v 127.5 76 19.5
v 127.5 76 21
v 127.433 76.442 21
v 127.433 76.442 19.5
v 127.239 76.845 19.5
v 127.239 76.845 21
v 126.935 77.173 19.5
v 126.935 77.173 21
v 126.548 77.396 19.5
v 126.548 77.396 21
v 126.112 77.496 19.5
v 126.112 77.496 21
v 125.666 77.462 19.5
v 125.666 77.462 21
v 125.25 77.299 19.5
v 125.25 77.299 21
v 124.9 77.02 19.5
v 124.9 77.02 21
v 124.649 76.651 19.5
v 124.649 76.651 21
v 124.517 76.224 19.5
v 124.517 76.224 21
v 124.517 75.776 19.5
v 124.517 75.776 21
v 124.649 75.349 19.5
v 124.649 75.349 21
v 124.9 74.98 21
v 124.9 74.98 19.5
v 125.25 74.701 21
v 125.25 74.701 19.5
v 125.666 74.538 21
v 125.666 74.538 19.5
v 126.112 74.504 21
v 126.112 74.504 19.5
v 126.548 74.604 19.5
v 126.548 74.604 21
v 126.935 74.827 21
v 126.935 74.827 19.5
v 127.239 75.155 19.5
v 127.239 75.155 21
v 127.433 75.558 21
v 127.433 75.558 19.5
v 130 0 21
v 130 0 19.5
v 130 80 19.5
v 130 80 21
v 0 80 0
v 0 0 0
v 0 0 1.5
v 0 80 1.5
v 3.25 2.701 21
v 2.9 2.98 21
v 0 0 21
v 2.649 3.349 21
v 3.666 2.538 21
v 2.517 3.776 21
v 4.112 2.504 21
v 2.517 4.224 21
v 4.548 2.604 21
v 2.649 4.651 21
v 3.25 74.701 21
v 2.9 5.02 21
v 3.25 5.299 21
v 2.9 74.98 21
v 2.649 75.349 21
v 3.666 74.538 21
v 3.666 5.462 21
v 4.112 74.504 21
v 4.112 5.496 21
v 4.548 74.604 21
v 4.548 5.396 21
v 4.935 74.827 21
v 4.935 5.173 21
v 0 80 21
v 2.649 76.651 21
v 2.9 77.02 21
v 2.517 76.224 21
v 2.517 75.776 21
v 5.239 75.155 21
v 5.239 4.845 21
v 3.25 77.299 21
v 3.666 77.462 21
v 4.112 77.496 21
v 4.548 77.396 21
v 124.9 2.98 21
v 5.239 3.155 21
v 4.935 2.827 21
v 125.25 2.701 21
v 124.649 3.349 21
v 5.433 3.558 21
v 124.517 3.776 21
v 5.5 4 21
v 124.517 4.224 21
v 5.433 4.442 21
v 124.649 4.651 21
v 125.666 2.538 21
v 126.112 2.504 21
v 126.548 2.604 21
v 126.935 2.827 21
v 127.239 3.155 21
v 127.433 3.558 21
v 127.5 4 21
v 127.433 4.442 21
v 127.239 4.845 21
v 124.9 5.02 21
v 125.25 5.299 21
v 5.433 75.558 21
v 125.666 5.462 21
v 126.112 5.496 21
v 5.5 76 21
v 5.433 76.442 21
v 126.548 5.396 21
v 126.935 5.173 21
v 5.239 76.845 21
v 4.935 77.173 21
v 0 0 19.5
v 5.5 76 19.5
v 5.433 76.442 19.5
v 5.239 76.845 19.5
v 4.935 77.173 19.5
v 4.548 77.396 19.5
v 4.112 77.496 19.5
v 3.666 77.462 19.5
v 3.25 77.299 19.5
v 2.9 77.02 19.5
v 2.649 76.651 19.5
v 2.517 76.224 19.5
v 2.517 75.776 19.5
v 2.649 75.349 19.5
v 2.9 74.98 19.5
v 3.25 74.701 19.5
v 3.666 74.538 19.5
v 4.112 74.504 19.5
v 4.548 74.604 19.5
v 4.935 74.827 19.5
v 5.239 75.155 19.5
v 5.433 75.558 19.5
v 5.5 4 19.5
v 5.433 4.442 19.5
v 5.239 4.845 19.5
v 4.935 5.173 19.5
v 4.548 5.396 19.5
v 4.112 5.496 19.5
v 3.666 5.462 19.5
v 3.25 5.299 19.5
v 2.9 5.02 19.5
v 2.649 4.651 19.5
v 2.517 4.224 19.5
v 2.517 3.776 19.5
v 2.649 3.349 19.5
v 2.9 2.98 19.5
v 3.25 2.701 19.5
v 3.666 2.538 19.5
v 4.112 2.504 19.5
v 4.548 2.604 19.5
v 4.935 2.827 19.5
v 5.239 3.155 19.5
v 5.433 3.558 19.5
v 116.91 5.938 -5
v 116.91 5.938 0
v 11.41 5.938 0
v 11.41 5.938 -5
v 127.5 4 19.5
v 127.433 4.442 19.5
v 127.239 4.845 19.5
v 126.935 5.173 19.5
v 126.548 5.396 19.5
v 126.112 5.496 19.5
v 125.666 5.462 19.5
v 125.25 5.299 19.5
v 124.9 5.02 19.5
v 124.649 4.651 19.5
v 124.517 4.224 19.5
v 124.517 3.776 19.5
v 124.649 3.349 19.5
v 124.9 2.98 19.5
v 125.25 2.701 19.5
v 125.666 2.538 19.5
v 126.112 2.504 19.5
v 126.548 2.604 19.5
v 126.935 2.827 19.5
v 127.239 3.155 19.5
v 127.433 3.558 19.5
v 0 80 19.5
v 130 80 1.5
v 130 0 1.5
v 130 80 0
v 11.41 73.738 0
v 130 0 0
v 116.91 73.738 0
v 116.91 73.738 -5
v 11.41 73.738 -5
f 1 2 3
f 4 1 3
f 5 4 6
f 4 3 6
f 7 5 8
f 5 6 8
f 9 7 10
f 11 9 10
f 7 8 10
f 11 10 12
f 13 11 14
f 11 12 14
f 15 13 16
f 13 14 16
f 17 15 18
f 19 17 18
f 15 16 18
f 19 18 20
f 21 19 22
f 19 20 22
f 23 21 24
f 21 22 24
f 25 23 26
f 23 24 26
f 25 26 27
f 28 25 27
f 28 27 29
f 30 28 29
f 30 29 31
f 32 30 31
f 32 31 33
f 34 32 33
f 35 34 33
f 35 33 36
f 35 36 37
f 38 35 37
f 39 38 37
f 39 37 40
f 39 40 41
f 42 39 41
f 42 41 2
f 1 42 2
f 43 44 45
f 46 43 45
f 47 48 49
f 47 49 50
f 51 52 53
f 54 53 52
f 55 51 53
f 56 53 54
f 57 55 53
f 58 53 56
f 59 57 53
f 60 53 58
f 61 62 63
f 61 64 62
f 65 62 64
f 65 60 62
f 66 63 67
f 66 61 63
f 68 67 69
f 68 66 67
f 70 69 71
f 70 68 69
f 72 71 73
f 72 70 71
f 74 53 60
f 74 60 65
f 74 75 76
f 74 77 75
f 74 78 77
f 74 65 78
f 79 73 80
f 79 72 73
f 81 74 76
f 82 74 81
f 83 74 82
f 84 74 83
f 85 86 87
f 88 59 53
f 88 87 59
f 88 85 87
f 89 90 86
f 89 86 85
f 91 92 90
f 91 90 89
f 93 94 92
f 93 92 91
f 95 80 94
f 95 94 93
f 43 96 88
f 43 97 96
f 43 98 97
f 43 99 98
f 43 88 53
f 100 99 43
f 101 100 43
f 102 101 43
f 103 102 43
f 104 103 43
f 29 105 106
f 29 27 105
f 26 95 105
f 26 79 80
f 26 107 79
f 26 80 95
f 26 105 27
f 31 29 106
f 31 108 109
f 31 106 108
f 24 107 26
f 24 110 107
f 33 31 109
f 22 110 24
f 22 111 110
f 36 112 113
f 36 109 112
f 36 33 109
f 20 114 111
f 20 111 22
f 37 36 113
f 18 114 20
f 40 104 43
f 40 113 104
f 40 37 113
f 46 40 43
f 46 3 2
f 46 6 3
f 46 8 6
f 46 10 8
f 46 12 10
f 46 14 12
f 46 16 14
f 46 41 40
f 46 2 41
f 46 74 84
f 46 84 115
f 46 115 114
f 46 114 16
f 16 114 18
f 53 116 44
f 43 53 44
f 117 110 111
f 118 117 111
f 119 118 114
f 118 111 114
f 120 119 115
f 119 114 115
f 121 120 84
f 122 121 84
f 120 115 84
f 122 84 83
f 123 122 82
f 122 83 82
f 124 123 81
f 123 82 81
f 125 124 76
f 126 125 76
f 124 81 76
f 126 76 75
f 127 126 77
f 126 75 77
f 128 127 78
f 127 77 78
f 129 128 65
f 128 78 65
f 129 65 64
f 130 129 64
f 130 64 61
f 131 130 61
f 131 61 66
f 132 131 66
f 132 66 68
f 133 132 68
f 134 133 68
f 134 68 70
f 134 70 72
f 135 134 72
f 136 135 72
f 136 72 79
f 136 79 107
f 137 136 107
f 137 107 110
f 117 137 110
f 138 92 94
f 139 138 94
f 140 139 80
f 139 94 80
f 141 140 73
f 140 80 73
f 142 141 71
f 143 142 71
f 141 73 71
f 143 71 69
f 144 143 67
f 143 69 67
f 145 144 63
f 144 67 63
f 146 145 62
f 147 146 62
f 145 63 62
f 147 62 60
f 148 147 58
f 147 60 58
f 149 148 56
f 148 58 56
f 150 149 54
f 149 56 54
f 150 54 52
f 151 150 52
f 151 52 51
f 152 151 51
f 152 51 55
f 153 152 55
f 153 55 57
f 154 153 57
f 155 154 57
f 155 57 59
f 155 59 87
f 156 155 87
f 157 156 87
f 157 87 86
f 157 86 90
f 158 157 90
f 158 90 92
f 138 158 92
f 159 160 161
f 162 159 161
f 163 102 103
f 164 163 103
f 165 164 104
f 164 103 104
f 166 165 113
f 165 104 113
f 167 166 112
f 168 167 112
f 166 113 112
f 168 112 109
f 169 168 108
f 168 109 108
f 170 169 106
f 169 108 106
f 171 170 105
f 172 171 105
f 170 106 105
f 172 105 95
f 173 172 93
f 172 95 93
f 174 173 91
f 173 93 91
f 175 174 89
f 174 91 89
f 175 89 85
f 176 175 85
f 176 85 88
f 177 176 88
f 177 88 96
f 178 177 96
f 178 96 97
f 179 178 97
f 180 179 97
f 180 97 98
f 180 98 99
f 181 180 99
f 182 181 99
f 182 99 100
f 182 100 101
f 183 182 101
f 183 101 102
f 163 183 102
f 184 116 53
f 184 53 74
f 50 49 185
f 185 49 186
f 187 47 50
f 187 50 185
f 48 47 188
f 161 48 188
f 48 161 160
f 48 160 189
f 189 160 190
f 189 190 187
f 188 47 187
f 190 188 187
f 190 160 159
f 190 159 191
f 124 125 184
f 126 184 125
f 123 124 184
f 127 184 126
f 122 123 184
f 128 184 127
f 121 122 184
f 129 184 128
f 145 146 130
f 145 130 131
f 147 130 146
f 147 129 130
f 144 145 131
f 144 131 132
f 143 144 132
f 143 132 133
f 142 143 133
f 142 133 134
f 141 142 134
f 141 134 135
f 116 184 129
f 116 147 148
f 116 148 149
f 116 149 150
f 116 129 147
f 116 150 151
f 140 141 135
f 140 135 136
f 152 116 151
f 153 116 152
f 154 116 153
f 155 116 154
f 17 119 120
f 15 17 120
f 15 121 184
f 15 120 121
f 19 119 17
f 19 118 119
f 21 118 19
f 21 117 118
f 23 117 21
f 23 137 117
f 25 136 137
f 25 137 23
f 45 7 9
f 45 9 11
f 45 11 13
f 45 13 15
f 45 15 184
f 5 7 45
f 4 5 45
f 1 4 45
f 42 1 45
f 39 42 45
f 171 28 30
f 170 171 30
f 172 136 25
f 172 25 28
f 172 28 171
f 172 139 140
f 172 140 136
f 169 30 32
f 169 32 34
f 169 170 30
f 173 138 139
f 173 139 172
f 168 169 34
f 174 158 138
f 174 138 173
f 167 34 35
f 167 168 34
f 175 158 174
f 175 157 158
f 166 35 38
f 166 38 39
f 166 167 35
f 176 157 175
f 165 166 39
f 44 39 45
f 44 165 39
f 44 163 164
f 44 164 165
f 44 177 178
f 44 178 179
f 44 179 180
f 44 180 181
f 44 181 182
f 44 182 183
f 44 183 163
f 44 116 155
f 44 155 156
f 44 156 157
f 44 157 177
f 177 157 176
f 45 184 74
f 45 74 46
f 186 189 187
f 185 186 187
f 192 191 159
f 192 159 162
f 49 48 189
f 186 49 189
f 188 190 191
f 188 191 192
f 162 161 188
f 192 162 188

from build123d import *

# Parameters (mm, degrees)
ESQUISSE1_W             = 130
ESQUISSE1_H             = 80
BOSS_EXTRU_1_DEPTH      = 21
COQUE3_T                = -1.5
ESQUISSE2_W             = 105.5
ESQUISSE2_H             = 67.8
BOSS_EXTRU_2_DEPTH      = 5
ESQUISSE3_R             = 1.5
ENL_V_MAT_EXTRU_1_DEPTH = 10
ESQUISSE4_W             = 130
ESQUISSE4_H             = 18
ENL_V_MAT_EXTRU_2_DEPTH = 10


with BuildPart() as part:
    # Esquisse1 → Boss.-Extru.1 (new body)
    with BuildSketch(Plane.XY):
        with Locations((65, 40)):
            Rectangle(ESQUISSE1_W, ESQUISSE1_H)
    extrude(amount=BOSS_EXTRU_1_DEPTH)

    # Coque3
    coque3_openings = [part.faces().sort_by_distance(p)[0] for p in [
        (130, 40, 10.5),
        (65, 0, 10.5),
        (0, 40, 10.5),
    ]]
    offset(amount=COQUE3_T, openings=coque3_openings, kind=Kind.INTERSECTION)

    # Esquisse2 → Boss.-Extru.2 (add)
    with BuildSketch(Plane(origin=(0, 0, 0), x_dir=(-1, 0, 0), z_dir=(0, 0, -1))):
        with Locations((-64.160280936, 39.837964272)):
            Rectangle(ESQUISSE2_W, ESQUISSE2_H)
    extrude(amount=BOSS_EXTRU_2_DEPTH)

    # Esquisse3 → Enlèv. mat.-Extru.1 (cut)
    with BuildSketch(Plane.XY.offset(21)):
        with Locations((4, 76)):
            Circle(ESQUISSE3_R)
        with Locations((4, 4)):
            Circle(ESQUISSE3_R)
        with Locations((126, 76)):
            Circle(ESQUISSE3_R)
        with Locations((126, 4)):
            Circle(ESQUISSE3_R)
    extrude(amount=-ENL_V_MAT_EXTRU_1_DEPTH, mode=Mode.SUBTRACT)

    # Esquisse4 → Enlèv. mat.-Extru.2 (cut)
    with BuildSketch(Plane.XZ.offset(-78.5)):
        with Locations((65, 10.5)):
            Rectangle(ESQUISSE4_W, ESQUISSE4_H)
    extrude(amount=-ENL_V_MAT_EXTRU_2_DEPTH, mode=Mode.SUBTRACT)


with BuildPart() as enl_v_mat_extru_2_piece_1:
    # of the separate pieces the step leaves, piece 1, a body of its own (enl_v_mat_extru_2_pieces)
    add(part.part.solids().sort_by_distance((130, 80, 0))[0])


with BuildPart() as enl_v_mat_extru_2_piece_2:
    # of the separate pieces the step leaves, piece 2, a body of its own (enl_v_mat_extru_2_pieces)
    add(part.part.solids().sort_by_distance((0, 80, 19.5))[0])


solid = Compound([enl_v_mat_extru_2_piece_1.part, enl_v_mat_extru_2_piece_2.part])
